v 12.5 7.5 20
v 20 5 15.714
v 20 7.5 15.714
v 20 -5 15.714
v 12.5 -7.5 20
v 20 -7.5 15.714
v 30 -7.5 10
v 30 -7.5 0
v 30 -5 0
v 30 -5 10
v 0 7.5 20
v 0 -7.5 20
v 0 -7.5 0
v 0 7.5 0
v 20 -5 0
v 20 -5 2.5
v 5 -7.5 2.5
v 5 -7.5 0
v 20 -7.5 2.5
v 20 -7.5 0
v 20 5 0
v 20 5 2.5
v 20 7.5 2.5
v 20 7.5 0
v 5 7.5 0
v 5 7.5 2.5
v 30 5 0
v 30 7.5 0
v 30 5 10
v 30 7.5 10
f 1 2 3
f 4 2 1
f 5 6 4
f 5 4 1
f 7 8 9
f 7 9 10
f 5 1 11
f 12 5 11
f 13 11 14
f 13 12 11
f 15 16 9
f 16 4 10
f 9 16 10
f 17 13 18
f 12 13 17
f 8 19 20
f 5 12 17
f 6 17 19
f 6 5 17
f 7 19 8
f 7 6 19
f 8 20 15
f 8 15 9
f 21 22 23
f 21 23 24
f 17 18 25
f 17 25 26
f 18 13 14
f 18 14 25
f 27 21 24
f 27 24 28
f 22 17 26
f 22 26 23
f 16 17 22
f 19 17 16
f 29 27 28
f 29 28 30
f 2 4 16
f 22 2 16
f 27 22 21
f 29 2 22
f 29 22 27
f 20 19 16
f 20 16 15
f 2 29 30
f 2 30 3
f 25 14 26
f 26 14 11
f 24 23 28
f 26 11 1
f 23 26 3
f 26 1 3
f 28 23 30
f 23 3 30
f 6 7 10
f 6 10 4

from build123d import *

# Parameters (mm, degrees)
F1_DEPTH = 7.5
F2_DEPTH = 5


with BuildPart() as f1:
    # F0 (on Front) → F1 (new body, symmetric)
    with BuildSketch(Plane.XZ):
        Polygon((0, 20), (0, 0), (5, 0), (5, 2.5), (20, 2.5), (20, 15.714286), (12.5, 20), align=None)
        Polygon((30, 10), (20, 15.714286), (20, 2.5), (20, 0), (30, 0), align=None)
    extrude(amount=F1_DEPTH, both=True)

    # F0 (on Front) → F2 (cut, symmetric)
    with BuildSketch(Plane.XZ):
        Polygon((30, 10), (20, 15.714286), (20, 2.5), (20, 0), (30, 0), align=None)
    extrude(amount=F2_DEPTH, both=True, mode=Mode.SUBTRACT)


solid = f1.part
